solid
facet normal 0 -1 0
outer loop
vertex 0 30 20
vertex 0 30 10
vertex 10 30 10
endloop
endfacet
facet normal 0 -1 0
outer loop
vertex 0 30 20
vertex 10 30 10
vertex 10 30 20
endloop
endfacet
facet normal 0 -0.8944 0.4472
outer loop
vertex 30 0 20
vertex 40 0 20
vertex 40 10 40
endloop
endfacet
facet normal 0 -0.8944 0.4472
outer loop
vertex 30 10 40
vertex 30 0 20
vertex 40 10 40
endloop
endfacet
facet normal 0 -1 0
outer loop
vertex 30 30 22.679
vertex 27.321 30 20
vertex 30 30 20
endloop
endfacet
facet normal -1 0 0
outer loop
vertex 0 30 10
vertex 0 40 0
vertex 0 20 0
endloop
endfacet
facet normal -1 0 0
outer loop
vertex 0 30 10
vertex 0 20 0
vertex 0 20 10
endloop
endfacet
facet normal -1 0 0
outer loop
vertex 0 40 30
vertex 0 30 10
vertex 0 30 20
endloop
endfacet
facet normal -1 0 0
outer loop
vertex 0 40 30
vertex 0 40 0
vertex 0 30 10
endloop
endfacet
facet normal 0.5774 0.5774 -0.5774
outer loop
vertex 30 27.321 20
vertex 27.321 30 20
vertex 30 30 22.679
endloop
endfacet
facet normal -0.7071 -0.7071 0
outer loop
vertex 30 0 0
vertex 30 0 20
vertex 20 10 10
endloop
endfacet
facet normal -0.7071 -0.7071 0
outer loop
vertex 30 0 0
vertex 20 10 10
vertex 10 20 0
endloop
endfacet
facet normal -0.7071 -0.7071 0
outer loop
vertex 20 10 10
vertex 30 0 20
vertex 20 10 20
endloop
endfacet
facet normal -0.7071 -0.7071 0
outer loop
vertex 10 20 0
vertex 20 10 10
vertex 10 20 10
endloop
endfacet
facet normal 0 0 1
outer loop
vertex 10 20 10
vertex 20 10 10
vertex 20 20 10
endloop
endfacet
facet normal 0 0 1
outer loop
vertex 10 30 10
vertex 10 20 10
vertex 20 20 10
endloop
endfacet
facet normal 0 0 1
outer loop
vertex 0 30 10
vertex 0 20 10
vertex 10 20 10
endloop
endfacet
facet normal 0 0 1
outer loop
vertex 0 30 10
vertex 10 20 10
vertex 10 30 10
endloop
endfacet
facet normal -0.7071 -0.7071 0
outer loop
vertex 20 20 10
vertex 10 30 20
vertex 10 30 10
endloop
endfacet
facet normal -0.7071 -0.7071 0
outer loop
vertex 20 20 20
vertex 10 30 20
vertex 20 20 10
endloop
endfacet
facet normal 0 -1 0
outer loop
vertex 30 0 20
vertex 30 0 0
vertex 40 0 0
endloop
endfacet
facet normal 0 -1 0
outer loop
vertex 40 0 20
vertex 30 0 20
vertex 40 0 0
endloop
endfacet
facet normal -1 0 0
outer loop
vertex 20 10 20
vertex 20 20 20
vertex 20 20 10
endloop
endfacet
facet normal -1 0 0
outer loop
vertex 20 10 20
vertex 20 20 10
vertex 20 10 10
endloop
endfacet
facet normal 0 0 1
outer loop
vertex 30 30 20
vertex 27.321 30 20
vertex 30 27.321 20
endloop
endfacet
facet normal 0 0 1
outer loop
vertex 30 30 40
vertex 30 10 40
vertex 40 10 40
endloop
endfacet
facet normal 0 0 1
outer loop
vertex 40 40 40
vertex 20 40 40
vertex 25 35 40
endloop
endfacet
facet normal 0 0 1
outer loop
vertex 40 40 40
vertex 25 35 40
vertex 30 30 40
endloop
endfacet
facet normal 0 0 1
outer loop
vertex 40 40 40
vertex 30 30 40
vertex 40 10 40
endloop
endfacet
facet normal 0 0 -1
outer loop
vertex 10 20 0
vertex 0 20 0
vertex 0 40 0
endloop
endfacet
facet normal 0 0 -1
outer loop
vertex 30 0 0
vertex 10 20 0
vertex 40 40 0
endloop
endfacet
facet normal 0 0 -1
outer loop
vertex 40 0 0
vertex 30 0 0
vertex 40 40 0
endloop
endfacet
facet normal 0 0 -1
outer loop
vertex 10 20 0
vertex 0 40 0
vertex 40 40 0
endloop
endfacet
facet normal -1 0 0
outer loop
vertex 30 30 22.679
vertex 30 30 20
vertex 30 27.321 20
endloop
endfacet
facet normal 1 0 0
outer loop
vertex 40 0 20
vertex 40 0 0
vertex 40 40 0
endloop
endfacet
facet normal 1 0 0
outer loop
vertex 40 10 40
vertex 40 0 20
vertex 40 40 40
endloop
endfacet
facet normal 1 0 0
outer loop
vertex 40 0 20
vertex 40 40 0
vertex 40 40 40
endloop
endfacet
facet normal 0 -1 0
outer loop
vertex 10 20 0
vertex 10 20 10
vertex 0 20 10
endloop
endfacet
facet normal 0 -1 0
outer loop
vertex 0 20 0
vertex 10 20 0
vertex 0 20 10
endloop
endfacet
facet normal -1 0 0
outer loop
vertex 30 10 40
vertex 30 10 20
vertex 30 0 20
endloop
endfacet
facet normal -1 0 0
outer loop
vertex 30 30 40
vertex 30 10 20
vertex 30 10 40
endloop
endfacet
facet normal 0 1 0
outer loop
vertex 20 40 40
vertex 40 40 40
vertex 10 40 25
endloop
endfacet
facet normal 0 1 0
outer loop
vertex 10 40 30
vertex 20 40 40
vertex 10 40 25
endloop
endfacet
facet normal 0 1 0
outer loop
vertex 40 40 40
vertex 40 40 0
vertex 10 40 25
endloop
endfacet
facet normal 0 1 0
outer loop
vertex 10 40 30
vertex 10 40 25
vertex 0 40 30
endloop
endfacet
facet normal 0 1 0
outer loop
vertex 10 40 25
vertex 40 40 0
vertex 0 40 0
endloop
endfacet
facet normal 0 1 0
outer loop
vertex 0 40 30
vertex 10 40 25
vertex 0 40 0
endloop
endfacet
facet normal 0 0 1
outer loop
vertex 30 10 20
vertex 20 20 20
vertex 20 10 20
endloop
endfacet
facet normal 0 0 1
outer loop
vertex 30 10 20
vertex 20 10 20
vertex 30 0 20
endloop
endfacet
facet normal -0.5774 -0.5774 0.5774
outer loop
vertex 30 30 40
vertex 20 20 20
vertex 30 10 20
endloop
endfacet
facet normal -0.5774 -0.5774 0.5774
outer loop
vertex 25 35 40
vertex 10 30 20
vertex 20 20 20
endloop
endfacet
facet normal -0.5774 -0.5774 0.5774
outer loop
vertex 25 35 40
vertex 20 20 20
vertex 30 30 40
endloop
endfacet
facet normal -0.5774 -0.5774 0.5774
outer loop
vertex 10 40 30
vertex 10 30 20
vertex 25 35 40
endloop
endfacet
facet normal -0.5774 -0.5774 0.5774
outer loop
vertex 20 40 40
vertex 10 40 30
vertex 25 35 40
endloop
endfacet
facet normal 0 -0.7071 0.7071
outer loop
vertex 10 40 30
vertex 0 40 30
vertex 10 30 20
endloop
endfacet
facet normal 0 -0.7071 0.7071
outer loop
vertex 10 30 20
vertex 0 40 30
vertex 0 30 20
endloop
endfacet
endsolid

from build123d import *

# Parameters (mm, degrees)
SKETCH1_W            = 40
SKETCH1_H            = 40
BOSS_EXTRUDE1_DEPTH  = 20
CUT_EXTRUDE1_DEPTH   = 20
SKETCH3_W            = 10
SKETCH3_H            = 10
CUT_EXTRUDE2_DEPTH   = 10
BOSS_EXTRUDE2_DEPTH  = 10
BOSS_EXTRUDE3_DEPTH  = 29
BOSS_EXTRUDE4_DEPTH  = 10
CUT_EXTRUDE3_DEPTH   = 10
BOSS_EXTRUDE5_DEPTH  = 10
SKETCH17_W           = 10
SKETCH17_H           = 10
BOSS_EXTRUDE8_DEPTH  = 30
CUT_EXTRUDE4_DEPTH   = 30
CUT_EXTRUDE5_DEPTH   = 10
CUT_EXTRUDE6_DEPTH   = 10
SKETCH21_W           = 5
SKETCH21_H           = 10
BOSS_EXTRUDE9_DEPTH  = 5
CUT_EXTRUDE7_DEPTH   = 5
CUT_EXTRUDE8_DEPTH   = 5
CUT_EXTRUDE9_DEPTH   = 5
BOSS_EXTRUDE10_DEPTH = 5
BOSS_EXTRUDE11_DEPTH = 5
SKETCH27_W           = 20
SKETCH27_H           = 5
BOSS_EXTRUDE12_DEPTH = 40
CUT_EXTRUDE10_DEPTH  = 19


with BuildPart() as part:
    # Sketch1 → Boss-Extrude1 (new body)
    with BuildSketch(Plane.XY):
        with Locations((20, 20)):
            Rectangle(SKETCH1_W, SKETCH1_H)
    extrude(amount=BOSS_EXTRUDE1_DEPTH)

    # Sketch2 → Cut-Extrude1 (cut)
    with BuildSketch(Plane.XY.offset(20)):
        Polygon((0, 0), (30, 0), (10, 20), (0, 20), align=None)
    extrude(amount=-CUT_EXTRUDE1_DEPTH, mode=Mode.SUBTRACT)

    # Sketch3 → Cut-Extrude2 (cut)
    with BuildSketch(Plane.ZY):
        with Locations((15, 25)):
            Rectangle(SKETCH3_W, SKETCH3_H)
    extrude(amount=-CUT_EXTRUDE2_DEPTH, mode=Mode.SUBTRACT)

    # Sketch5 → Boss-Extrude2 (add)
    with BuildSketch(Plane(origin=(40, 0, 0), x_dir=(0, 0, -1), z_dir=(1, 0, 0))):
        Polygon((-20, 40), (-20, 0), (-40, 10), (-40, 40), align=None)
    extrude(amount=-BOSS_EXTRUDE2_DEPTH)

    # Sketch7 → Boss-Extrude3 (add)
    with BuildSketch(Plane.XY.offset(40)):
        Polygon((30, 30), (30, 40), (20, 40), align=None)
    extrude(amount=-BOSS_EXTRUDE3_DEPTH)

    # Sketch8 → Boss-Extrude4 (add)
    with BuildSketch(Plane.ZY):
        Polygon((20, 40), (20, 30), (30, 40), align=None)
    extrude(amount=-BOSS_EXTRUDE4_DEPTH)

    # Sketch9 → Cut-Extrude3 (cut)
    with BuildSketch(Plane.XY.offset(20)):
        Polygon((10, 30), (20, 20), (20, 10), (10, 20), align=None)
    extrude(amount=-CUT_EXTRUDE3_DEPTH, mode=Mode.SUBTRACT)

    # Sketch15 → Boss-Extrude5 (add)
    with BuildSketch(Plane(origin=(6.666666667, 6.666666667, -6.666666667), x_dir=(-0.40824829046386313, -0.40824829046386274, -0.8164965809277261), z_dir=(0.5773502691896262, 0.5773502691896255, -0.5773502691896256))):
        Polygon((-57.154760665, 0), (-57.154760665, 14.142135624), (-32.659863237, 14.142135624), (-32.659863237, -14.142135624), align=None)
    extrude(amount=BOSS_EXTRUDE5_DEPTH)

    # Sketch17 → Boss-Extrude8 (add)
    with BuildSketch(Plane.ZY):
        with Locations((25, 35)):
            Rectangle(SKETCH17_W, SKETCH17_H)
    extrude(amount=-BOSS_EXTRUDE8_DEPTH)

    # Sketch18 → Cut-Extrude4 (cut)
    with BuildSketch(Plane(origin=(0, 40, 0), x_dir=(1, 0, 0), z_dir=(0, 1, 0))):
        Polygon((20, -40), (31.547005384, -34.226497308), (20, -22.679491924), (20, -30), align=None)
    extrude(amount=CUT_EXTRUDE4_DEPTH, mode=Mode.SUBTRACT)

    # Sketch19 → Cut-Extrude5 (cut)
    with BuildSketch(Plane.ZY):
        Polygon((30, 40), (20, 30), (30, 30), align=None)
    extrude(amount=-CUT_EXTRUDE5_DEPTH, mode=Mode.SUBTRACT)

    # Sketch20 → Cut-Extrude6 (cut)
    with BuildSketch(Plane(origin=(6.666666667, 6.666666667, -6.666666667), x_dir=(0.40824829046386324, 0.4082482904638628, 0.816496580927726), z_dir=(-0.5773502691896261, -0.5773502691896254, 0.5773502691896257))):
        Polygon((44.907311951, 7.071067812), (44.907311951, 14.142135624), (32.659863237, 14.142135624), align=None)
    extrude(amount=CUT_EXTRUDE6_DEPTH, mode=Mode.SUBTRACT)

    # Sketch21 → Boss-Extrude9 (add)
    with BuildSketch(Plane(origin=(0, 40, 0), x_dir=(1, 0, 0), z_dir=(0, 1, 0))):
        with Locations((17.5, -35)):
            Rectangle(SKETCH21_W, SKETCH21_H)
    extrude(amount=-BOSS_EXTRUDE9_DEPTH)

    # Sketch22 → Cut-Extrude7 (cut)
    with BuildSketch(Plane(origin=(0, 40, 0), x_dir=(1, 0, 0), z_dir=(0, 1, 0))):
        Polygon((20, -40), (15, -35), (15, -40), align=None)
    extrude(amount=-CUT_EXTRUDE7_DEPTH, mode=Mode.SUBTRACT)

    # Sketch23 → Cut-Extrude8 (cut)
    with BuildSketch(Plane(origin=(6.666666667, 6.666666667, -6.666666667), x_dir=(0.40824829046386324, 0.4082482904638628, 0.816496580927726), z_dir=(-0.5773502691896261, -0.5773502691896254, 0.5773502691896257))):
        Polygon((44.907311951, 14.142135624), (44.907311951, 21.213203436), (32.659863237, 14.142135624), align=None)
    extrude(amount=CUT_EXTRUDE8_DEPTH, mode=Mode.SUBTRACT)


with BuildPart() as cut_extrude8_piece_1:
    # of the separate pieces the step leaves, piece 1, a body of its own (cut_extrude8_pieces)
    add(part.part.solids().sort_by_distance((30, 0, 0))[0])

    # Sketch25 → Boss-Extrude10 (add)
    with BuildSketch(Plane(origin=(0, 40, 0), x_dir=(1, 0, 0), z_dir=(0, 1, 0))):
        Polygon((15, -35), (10, -30), (15, -30), align=None)
    extrude(amount=-BOSS_EXTRUDE10_DEPTH)

    # Sketch26 → Boss-Extrude11 (add)
    with BuildSketch(Plane(origin=(0, 0, 30), x_dir=(-1, 0, 0), z_dir=(0, 0, -1))):
        Polygon((-15, 35), (-10, 40), (-10, 35), align=None)
    extrude(amount=BOSS_EXTRUDE11_DEPTH)

    # Sketch27 → Boss-Extrude12 (add)
    with BuildSketch(Plane(origin=(0, 0, 0), x_dir=(-1, 0, 0), z_dir=(0, 0, -1))):
        with Locations((-30, 37.5)):
            Rectangle(SKETCH27_W, SKETCH27_H)
    extrude(amount=-BOSS_EXTRUDE12_DEPTH)

    # 3DSketch1 → Cut-Extrude10 (cut, along a direction that is not the sketch's normal)
    with BuildSketch(Plane(origin=(10, 30, 20), x_dir=(0.7071067811865477, 0, 0.7071067811865475), z_dir=(0.5773502691896258, 0.5773502691896254, -0.5773502691896261))):
        Polygon((0, 0), (7.071067812, -12.247448714), (21.213203436, -12.247448714), (28.284271247, 0), (14.142135624, 24.494897428), align=None)
    extrude(amount=-CUT_EXTRUDE10_DEPTH, dir=(0, 0, -1), mode=Mode.SUBTRACT)


with BuildPart() as cut_extrude8_piece_2:
    # of the separate pieces the step leaves, piece 2, a body of its own (cut_extrude8_pieces)
    add(part.part.solids().sort_by_distance((10, 30, 30))[0])

    # Sketch24 → Cut-Extrude9 (cut)
    with BuildSketch(Plane(origin=(3.779915321, 3.779915321, -3.779915321), x_dir=(-0.4082482904638635, -0.40824829046386263, -0.816496580927726), z_dir=(0.5773502691896261, 0.5773502691896255, -0.5773502691896258))):
        Polygon((-41.371778045, 14.142135624), (-41.371778045, 15.089479079), (-39.730931049, 14.142135624), align=None)
    extrude(amount=-CUT_EXTRUDE9_DEPTH, mode=Mode.SUBTRACT)


solid = cut_extrude8_piece_1.part
